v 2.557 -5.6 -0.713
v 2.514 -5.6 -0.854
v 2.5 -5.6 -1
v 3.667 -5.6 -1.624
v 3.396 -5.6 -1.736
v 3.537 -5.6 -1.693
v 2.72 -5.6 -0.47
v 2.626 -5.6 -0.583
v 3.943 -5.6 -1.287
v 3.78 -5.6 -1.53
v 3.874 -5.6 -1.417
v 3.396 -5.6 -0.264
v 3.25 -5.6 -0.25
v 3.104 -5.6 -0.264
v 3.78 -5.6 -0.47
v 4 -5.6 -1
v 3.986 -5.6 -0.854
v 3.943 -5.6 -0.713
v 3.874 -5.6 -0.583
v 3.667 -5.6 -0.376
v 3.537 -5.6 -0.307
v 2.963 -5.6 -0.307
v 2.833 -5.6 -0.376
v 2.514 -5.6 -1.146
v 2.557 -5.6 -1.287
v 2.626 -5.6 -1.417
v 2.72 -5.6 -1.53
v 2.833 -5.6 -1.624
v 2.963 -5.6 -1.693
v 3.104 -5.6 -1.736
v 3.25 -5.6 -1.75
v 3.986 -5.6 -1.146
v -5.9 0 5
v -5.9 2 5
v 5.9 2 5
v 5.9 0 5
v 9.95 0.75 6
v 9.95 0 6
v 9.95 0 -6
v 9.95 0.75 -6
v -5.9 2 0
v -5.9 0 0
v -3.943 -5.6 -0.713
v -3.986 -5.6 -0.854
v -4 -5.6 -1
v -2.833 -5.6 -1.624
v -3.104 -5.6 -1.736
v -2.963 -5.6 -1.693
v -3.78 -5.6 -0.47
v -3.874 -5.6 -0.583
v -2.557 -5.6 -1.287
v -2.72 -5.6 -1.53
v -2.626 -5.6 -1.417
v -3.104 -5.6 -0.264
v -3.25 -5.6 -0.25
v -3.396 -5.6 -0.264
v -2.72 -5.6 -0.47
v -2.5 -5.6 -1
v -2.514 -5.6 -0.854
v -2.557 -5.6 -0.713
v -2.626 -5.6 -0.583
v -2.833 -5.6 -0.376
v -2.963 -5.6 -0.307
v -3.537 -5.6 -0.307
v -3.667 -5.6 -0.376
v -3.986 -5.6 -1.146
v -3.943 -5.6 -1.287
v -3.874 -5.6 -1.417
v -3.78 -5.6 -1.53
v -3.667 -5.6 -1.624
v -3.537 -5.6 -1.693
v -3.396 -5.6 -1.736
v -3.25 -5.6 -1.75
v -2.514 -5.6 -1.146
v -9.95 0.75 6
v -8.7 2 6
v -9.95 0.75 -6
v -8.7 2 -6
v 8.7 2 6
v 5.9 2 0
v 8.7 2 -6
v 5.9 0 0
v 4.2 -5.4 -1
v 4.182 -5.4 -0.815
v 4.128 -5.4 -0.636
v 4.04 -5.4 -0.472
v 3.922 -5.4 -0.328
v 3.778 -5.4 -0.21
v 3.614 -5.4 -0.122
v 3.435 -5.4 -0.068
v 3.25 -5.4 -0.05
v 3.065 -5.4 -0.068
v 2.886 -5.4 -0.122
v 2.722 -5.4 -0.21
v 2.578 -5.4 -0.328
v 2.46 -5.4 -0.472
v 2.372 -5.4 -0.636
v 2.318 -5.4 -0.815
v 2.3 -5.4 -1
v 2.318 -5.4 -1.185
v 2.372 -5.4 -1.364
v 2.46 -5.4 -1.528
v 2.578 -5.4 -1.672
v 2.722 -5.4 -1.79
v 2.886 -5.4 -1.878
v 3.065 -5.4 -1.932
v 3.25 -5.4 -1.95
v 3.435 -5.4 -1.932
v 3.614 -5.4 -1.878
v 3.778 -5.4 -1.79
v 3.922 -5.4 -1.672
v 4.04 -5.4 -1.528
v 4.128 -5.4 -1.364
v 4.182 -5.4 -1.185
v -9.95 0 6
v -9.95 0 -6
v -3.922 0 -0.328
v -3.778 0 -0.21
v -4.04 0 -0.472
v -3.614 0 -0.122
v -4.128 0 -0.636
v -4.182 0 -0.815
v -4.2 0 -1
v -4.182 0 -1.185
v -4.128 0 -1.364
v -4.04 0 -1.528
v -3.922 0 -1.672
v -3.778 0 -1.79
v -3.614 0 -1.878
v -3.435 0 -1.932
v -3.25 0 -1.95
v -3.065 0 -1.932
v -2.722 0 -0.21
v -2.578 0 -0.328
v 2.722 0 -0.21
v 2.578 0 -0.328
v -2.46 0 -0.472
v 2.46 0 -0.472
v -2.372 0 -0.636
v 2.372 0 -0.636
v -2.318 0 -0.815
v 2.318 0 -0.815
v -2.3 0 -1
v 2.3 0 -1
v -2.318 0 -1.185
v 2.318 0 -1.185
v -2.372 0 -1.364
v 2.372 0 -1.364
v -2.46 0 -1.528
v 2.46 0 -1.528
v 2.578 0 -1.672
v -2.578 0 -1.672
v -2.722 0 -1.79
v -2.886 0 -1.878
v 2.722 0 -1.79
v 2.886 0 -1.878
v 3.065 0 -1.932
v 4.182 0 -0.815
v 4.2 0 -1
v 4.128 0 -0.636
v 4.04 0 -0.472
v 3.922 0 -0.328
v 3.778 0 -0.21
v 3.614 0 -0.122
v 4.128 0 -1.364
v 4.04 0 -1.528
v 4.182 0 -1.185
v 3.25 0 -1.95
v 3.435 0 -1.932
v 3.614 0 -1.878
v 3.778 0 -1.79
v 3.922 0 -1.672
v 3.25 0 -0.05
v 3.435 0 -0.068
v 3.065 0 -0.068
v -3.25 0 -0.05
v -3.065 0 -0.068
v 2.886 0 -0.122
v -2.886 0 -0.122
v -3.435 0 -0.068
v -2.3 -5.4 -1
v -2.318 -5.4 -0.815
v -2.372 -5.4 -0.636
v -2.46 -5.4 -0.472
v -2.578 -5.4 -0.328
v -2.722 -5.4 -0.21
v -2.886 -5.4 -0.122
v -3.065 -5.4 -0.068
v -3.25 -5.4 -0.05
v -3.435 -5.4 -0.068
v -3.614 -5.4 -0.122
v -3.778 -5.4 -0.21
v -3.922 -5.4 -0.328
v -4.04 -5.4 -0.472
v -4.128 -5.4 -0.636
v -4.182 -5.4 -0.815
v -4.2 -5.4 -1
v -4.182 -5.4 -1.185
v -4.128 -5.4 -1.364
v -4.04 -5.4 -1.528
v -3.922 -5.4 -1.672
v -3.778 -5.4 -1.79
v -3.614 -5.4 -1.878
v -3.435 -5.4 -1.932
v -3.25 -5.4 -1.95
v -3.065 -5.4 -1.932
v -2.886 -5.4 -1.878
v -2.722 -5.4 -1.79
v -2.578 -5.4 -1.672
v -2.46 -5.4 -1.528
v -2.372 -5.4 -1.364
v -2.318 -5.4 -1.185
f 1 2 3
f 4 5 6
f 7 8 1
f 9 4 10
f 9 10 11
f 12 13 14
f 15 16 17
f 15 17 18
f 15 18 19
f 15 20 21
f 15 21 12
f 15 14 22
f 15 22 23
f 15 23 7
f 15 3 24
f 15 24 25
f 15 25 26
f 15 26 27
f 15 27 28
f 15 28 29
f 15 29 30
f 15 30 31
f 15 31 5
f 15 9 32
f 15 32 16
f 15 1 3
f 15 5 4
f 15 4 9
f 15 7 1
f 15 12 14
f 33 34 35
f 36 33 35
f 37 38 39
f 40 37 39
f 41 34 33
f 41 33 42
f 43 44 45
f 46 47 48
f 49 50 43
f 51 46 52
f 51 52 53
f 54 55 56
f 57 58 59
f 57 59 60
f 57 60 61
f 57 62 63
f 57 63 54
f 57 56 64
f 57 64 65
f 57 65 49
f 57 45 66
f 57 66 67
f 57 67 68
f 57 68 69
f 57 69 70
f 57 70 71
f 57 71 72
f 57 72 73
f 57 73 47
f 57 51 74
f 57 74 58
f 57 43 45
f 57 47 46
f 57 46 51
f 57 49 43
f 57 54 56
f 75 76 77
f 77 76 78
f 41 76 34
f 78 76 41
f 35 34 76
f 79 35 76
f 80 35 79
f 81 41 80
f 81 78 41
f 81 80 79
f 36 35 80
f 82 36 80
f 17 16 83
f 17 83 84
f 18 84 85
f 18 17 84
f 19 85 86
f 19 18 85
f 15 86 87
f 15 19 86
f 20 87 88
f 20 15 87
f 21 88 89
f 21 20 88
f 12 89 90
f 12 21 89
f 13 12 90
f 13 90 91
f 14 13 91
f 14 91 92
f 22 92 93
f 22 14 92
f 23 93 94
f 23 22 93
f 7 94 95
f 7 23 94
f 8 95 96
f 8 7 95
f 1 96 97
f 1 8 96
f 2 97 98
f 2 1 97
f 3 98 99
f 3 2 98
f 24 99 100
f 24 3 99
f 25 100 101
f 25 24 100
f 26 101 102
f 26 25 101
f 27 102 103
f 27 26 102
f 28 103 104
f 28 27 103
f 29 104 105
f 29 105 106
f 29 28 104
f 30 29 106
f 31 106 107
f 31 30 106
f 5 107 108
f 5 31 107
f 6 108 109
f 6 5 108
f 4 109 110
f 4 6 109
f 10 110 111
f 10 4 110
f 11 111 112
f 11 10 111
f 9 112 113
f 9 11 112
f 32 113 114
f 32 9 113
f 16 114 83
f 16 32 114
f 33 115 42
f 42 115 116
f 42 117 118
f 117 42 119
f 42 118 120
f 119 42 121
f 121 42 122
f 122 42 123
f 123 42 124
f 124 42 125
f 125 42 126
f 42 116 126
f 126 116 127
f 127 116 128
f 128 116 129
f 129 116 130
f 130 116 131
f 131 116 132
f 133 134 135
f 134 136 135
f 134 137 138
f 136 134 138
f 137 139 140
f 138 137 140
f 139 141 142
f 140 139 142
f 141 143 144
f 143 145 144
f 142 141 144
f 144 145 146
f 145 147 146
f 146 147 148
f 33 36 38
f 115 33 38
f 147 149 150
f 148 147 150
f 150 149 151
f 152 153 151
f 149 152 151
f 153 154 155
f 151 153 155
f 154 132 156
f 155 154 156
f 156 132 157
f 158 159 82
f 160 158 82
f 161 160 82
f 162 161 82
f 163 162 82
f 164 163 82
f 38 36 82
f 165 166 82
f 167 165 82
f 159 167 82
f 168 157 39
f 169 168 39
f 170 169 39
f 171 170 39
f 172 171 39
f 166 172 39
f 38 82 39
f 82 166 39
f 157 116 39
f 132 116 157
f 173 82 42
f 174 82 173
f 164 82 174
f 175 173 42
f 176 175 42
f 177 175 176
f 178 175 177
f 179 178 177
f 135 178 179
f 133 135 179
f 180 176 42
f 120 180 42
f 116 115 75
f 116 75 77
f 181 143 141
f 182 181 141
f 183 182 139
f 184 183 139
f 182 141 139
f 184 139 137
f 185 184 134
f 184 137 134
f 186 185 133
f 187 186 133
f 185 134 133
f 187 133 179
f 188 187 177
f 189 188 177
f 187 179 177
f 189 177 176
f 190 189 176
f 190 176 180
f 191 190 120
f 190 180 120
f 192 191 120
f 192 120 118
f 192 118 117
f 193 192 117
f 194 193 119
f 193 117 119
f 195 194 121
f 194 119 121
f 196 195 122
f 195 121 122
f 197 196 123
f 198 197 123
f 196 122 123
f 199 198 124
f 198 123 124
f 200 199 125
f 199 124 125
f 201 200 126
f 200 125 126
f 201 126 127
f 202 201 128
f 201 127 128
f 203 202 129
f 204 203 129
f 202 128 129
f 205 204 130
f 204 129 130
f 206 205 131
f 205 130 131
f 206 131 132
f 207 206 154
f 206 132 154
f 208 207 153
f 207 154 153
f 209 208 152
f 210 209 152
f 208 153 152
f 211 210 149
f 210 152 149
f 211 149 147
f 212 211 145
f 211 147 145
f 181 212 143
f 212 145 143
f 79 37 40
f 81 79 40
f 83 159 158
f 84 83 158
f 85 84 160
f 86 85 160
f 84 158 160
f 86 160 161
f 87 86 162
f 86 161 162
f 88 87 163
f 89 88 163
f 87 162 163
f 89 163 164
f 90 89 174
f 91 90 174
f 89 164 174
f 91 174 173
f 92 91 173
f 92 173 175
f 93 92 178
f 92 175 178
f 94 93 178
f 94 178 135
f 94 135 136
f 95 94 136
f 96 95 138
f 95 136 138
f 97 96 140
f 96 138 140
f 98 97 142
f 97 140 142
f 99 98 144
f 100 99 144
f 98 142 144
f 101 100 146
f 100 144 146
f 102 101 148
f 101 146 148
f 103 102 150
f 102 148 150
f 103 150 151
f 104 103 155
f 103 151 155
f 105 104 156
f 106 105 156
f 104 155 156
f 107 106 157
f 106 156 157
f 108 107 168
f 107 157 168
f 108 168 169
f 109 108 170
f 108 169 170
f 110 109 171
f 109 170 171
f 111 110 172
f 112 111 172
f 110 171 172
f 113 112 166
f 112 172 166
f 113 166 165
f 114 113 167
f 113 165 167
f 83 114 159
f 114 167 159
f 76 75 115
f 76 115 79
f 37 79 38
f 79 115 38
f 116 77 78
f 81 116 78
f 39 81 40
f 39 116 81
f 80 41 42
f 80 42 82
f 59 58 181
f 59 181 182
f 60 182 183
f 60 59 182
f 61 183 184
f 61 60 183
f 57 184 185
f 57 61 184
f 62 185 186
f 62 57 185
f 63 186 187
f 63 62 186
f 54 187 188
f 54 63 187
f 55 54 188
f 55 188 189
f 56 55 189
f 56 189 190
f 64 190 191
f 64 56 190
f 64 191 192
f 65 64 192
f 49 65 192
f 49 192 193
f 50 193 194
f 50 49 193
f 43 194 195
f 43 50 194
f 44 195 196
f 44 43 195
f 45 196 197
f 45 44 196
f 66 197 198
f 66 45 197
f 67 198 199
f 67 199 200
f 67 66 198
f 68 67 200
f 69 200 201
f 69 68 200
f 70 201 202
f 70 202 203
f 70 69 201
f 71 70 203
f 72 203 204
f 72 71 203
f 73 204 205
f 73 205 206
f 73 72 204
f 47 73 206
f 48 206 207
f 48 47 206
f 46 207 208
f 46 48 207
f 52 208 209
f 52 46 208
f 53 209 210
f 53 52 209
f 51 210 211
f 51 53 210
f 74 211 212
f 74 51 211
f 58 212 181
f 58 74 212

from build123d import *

# Parameters (mm, degrees)
SKETCH1_W           = 19.9
SKETCH1_H           = 12
BOSS_EXTRUDE1_DEPTH = 2
SKETCH2_W           = 11.8
SKETCH2_H           = 5
CUT_EXTRUDE1_DEPTH  = 3
CHAMFER1_SIZE       = 1.25
SKETCH3_R           = 0.95
BOSS_EXTRUDE2_DEPTH = 5.6
CHAMFER2_SIZE       = 0.2


with BuildPart() as part:
    # Sketch1 → Boss-Extrude1 (new body)
    with BuildSketch(Plane(origin=(0, 0, 0), x_dir=(1, 0, 0), z_dir=(0, 1, 0))):
        Rectangle(SKETCH1_W, SKETCH1_H)
    extrude(amount=BOSS_EXTRUDE1_DEPTH)

    # Sketch2 → Cut-Extrude1 (cut, through all)
    with BuildSketch(Plane(origin=(0, 2, 0), x_dir=(1, 0, 0), z_dir=(0, 1, 0))):
        with Locations((0, -2.5)):
            Rectangle(SKETCH2_W, SKETCH2_H)
    extrude(amount=-CUT_EXTRUDE1_DEPTH, mode=Mode.SUBTRACT)

    # Chamfer1
    chamfer1_edges = [part.edges().sort_by_distance(p)[0] for p in [
        (-9.95, 2, 0),
        (9.95, 2, 0),
    ]]
    chamfer(chamfer1_edges, length=CHAMFER1_SIZE)

    # Sketch3 → Boss-Extrude2 (add)
    with BuildSketch(Plane.XZ):
        with Locations((-3.25, -1)):
            Circle(SKETCH3_R)
        with Locations((3.25, -1)):
            Circle(SKETCH3_R)
    extrude(amount=BOSS_EXTRUDE2_DEPTH)

    # Chamfer2
    chamfer2_edges = [part.edges().sort_by_distance(p)[0] for p in [
        (-4.2, -5.6, -1),
        (2.3, -5.6, -1),
    ]]
    chamfer(chamfer2_edges, length=CHAMFER2_SIZE)


solid = part.part
